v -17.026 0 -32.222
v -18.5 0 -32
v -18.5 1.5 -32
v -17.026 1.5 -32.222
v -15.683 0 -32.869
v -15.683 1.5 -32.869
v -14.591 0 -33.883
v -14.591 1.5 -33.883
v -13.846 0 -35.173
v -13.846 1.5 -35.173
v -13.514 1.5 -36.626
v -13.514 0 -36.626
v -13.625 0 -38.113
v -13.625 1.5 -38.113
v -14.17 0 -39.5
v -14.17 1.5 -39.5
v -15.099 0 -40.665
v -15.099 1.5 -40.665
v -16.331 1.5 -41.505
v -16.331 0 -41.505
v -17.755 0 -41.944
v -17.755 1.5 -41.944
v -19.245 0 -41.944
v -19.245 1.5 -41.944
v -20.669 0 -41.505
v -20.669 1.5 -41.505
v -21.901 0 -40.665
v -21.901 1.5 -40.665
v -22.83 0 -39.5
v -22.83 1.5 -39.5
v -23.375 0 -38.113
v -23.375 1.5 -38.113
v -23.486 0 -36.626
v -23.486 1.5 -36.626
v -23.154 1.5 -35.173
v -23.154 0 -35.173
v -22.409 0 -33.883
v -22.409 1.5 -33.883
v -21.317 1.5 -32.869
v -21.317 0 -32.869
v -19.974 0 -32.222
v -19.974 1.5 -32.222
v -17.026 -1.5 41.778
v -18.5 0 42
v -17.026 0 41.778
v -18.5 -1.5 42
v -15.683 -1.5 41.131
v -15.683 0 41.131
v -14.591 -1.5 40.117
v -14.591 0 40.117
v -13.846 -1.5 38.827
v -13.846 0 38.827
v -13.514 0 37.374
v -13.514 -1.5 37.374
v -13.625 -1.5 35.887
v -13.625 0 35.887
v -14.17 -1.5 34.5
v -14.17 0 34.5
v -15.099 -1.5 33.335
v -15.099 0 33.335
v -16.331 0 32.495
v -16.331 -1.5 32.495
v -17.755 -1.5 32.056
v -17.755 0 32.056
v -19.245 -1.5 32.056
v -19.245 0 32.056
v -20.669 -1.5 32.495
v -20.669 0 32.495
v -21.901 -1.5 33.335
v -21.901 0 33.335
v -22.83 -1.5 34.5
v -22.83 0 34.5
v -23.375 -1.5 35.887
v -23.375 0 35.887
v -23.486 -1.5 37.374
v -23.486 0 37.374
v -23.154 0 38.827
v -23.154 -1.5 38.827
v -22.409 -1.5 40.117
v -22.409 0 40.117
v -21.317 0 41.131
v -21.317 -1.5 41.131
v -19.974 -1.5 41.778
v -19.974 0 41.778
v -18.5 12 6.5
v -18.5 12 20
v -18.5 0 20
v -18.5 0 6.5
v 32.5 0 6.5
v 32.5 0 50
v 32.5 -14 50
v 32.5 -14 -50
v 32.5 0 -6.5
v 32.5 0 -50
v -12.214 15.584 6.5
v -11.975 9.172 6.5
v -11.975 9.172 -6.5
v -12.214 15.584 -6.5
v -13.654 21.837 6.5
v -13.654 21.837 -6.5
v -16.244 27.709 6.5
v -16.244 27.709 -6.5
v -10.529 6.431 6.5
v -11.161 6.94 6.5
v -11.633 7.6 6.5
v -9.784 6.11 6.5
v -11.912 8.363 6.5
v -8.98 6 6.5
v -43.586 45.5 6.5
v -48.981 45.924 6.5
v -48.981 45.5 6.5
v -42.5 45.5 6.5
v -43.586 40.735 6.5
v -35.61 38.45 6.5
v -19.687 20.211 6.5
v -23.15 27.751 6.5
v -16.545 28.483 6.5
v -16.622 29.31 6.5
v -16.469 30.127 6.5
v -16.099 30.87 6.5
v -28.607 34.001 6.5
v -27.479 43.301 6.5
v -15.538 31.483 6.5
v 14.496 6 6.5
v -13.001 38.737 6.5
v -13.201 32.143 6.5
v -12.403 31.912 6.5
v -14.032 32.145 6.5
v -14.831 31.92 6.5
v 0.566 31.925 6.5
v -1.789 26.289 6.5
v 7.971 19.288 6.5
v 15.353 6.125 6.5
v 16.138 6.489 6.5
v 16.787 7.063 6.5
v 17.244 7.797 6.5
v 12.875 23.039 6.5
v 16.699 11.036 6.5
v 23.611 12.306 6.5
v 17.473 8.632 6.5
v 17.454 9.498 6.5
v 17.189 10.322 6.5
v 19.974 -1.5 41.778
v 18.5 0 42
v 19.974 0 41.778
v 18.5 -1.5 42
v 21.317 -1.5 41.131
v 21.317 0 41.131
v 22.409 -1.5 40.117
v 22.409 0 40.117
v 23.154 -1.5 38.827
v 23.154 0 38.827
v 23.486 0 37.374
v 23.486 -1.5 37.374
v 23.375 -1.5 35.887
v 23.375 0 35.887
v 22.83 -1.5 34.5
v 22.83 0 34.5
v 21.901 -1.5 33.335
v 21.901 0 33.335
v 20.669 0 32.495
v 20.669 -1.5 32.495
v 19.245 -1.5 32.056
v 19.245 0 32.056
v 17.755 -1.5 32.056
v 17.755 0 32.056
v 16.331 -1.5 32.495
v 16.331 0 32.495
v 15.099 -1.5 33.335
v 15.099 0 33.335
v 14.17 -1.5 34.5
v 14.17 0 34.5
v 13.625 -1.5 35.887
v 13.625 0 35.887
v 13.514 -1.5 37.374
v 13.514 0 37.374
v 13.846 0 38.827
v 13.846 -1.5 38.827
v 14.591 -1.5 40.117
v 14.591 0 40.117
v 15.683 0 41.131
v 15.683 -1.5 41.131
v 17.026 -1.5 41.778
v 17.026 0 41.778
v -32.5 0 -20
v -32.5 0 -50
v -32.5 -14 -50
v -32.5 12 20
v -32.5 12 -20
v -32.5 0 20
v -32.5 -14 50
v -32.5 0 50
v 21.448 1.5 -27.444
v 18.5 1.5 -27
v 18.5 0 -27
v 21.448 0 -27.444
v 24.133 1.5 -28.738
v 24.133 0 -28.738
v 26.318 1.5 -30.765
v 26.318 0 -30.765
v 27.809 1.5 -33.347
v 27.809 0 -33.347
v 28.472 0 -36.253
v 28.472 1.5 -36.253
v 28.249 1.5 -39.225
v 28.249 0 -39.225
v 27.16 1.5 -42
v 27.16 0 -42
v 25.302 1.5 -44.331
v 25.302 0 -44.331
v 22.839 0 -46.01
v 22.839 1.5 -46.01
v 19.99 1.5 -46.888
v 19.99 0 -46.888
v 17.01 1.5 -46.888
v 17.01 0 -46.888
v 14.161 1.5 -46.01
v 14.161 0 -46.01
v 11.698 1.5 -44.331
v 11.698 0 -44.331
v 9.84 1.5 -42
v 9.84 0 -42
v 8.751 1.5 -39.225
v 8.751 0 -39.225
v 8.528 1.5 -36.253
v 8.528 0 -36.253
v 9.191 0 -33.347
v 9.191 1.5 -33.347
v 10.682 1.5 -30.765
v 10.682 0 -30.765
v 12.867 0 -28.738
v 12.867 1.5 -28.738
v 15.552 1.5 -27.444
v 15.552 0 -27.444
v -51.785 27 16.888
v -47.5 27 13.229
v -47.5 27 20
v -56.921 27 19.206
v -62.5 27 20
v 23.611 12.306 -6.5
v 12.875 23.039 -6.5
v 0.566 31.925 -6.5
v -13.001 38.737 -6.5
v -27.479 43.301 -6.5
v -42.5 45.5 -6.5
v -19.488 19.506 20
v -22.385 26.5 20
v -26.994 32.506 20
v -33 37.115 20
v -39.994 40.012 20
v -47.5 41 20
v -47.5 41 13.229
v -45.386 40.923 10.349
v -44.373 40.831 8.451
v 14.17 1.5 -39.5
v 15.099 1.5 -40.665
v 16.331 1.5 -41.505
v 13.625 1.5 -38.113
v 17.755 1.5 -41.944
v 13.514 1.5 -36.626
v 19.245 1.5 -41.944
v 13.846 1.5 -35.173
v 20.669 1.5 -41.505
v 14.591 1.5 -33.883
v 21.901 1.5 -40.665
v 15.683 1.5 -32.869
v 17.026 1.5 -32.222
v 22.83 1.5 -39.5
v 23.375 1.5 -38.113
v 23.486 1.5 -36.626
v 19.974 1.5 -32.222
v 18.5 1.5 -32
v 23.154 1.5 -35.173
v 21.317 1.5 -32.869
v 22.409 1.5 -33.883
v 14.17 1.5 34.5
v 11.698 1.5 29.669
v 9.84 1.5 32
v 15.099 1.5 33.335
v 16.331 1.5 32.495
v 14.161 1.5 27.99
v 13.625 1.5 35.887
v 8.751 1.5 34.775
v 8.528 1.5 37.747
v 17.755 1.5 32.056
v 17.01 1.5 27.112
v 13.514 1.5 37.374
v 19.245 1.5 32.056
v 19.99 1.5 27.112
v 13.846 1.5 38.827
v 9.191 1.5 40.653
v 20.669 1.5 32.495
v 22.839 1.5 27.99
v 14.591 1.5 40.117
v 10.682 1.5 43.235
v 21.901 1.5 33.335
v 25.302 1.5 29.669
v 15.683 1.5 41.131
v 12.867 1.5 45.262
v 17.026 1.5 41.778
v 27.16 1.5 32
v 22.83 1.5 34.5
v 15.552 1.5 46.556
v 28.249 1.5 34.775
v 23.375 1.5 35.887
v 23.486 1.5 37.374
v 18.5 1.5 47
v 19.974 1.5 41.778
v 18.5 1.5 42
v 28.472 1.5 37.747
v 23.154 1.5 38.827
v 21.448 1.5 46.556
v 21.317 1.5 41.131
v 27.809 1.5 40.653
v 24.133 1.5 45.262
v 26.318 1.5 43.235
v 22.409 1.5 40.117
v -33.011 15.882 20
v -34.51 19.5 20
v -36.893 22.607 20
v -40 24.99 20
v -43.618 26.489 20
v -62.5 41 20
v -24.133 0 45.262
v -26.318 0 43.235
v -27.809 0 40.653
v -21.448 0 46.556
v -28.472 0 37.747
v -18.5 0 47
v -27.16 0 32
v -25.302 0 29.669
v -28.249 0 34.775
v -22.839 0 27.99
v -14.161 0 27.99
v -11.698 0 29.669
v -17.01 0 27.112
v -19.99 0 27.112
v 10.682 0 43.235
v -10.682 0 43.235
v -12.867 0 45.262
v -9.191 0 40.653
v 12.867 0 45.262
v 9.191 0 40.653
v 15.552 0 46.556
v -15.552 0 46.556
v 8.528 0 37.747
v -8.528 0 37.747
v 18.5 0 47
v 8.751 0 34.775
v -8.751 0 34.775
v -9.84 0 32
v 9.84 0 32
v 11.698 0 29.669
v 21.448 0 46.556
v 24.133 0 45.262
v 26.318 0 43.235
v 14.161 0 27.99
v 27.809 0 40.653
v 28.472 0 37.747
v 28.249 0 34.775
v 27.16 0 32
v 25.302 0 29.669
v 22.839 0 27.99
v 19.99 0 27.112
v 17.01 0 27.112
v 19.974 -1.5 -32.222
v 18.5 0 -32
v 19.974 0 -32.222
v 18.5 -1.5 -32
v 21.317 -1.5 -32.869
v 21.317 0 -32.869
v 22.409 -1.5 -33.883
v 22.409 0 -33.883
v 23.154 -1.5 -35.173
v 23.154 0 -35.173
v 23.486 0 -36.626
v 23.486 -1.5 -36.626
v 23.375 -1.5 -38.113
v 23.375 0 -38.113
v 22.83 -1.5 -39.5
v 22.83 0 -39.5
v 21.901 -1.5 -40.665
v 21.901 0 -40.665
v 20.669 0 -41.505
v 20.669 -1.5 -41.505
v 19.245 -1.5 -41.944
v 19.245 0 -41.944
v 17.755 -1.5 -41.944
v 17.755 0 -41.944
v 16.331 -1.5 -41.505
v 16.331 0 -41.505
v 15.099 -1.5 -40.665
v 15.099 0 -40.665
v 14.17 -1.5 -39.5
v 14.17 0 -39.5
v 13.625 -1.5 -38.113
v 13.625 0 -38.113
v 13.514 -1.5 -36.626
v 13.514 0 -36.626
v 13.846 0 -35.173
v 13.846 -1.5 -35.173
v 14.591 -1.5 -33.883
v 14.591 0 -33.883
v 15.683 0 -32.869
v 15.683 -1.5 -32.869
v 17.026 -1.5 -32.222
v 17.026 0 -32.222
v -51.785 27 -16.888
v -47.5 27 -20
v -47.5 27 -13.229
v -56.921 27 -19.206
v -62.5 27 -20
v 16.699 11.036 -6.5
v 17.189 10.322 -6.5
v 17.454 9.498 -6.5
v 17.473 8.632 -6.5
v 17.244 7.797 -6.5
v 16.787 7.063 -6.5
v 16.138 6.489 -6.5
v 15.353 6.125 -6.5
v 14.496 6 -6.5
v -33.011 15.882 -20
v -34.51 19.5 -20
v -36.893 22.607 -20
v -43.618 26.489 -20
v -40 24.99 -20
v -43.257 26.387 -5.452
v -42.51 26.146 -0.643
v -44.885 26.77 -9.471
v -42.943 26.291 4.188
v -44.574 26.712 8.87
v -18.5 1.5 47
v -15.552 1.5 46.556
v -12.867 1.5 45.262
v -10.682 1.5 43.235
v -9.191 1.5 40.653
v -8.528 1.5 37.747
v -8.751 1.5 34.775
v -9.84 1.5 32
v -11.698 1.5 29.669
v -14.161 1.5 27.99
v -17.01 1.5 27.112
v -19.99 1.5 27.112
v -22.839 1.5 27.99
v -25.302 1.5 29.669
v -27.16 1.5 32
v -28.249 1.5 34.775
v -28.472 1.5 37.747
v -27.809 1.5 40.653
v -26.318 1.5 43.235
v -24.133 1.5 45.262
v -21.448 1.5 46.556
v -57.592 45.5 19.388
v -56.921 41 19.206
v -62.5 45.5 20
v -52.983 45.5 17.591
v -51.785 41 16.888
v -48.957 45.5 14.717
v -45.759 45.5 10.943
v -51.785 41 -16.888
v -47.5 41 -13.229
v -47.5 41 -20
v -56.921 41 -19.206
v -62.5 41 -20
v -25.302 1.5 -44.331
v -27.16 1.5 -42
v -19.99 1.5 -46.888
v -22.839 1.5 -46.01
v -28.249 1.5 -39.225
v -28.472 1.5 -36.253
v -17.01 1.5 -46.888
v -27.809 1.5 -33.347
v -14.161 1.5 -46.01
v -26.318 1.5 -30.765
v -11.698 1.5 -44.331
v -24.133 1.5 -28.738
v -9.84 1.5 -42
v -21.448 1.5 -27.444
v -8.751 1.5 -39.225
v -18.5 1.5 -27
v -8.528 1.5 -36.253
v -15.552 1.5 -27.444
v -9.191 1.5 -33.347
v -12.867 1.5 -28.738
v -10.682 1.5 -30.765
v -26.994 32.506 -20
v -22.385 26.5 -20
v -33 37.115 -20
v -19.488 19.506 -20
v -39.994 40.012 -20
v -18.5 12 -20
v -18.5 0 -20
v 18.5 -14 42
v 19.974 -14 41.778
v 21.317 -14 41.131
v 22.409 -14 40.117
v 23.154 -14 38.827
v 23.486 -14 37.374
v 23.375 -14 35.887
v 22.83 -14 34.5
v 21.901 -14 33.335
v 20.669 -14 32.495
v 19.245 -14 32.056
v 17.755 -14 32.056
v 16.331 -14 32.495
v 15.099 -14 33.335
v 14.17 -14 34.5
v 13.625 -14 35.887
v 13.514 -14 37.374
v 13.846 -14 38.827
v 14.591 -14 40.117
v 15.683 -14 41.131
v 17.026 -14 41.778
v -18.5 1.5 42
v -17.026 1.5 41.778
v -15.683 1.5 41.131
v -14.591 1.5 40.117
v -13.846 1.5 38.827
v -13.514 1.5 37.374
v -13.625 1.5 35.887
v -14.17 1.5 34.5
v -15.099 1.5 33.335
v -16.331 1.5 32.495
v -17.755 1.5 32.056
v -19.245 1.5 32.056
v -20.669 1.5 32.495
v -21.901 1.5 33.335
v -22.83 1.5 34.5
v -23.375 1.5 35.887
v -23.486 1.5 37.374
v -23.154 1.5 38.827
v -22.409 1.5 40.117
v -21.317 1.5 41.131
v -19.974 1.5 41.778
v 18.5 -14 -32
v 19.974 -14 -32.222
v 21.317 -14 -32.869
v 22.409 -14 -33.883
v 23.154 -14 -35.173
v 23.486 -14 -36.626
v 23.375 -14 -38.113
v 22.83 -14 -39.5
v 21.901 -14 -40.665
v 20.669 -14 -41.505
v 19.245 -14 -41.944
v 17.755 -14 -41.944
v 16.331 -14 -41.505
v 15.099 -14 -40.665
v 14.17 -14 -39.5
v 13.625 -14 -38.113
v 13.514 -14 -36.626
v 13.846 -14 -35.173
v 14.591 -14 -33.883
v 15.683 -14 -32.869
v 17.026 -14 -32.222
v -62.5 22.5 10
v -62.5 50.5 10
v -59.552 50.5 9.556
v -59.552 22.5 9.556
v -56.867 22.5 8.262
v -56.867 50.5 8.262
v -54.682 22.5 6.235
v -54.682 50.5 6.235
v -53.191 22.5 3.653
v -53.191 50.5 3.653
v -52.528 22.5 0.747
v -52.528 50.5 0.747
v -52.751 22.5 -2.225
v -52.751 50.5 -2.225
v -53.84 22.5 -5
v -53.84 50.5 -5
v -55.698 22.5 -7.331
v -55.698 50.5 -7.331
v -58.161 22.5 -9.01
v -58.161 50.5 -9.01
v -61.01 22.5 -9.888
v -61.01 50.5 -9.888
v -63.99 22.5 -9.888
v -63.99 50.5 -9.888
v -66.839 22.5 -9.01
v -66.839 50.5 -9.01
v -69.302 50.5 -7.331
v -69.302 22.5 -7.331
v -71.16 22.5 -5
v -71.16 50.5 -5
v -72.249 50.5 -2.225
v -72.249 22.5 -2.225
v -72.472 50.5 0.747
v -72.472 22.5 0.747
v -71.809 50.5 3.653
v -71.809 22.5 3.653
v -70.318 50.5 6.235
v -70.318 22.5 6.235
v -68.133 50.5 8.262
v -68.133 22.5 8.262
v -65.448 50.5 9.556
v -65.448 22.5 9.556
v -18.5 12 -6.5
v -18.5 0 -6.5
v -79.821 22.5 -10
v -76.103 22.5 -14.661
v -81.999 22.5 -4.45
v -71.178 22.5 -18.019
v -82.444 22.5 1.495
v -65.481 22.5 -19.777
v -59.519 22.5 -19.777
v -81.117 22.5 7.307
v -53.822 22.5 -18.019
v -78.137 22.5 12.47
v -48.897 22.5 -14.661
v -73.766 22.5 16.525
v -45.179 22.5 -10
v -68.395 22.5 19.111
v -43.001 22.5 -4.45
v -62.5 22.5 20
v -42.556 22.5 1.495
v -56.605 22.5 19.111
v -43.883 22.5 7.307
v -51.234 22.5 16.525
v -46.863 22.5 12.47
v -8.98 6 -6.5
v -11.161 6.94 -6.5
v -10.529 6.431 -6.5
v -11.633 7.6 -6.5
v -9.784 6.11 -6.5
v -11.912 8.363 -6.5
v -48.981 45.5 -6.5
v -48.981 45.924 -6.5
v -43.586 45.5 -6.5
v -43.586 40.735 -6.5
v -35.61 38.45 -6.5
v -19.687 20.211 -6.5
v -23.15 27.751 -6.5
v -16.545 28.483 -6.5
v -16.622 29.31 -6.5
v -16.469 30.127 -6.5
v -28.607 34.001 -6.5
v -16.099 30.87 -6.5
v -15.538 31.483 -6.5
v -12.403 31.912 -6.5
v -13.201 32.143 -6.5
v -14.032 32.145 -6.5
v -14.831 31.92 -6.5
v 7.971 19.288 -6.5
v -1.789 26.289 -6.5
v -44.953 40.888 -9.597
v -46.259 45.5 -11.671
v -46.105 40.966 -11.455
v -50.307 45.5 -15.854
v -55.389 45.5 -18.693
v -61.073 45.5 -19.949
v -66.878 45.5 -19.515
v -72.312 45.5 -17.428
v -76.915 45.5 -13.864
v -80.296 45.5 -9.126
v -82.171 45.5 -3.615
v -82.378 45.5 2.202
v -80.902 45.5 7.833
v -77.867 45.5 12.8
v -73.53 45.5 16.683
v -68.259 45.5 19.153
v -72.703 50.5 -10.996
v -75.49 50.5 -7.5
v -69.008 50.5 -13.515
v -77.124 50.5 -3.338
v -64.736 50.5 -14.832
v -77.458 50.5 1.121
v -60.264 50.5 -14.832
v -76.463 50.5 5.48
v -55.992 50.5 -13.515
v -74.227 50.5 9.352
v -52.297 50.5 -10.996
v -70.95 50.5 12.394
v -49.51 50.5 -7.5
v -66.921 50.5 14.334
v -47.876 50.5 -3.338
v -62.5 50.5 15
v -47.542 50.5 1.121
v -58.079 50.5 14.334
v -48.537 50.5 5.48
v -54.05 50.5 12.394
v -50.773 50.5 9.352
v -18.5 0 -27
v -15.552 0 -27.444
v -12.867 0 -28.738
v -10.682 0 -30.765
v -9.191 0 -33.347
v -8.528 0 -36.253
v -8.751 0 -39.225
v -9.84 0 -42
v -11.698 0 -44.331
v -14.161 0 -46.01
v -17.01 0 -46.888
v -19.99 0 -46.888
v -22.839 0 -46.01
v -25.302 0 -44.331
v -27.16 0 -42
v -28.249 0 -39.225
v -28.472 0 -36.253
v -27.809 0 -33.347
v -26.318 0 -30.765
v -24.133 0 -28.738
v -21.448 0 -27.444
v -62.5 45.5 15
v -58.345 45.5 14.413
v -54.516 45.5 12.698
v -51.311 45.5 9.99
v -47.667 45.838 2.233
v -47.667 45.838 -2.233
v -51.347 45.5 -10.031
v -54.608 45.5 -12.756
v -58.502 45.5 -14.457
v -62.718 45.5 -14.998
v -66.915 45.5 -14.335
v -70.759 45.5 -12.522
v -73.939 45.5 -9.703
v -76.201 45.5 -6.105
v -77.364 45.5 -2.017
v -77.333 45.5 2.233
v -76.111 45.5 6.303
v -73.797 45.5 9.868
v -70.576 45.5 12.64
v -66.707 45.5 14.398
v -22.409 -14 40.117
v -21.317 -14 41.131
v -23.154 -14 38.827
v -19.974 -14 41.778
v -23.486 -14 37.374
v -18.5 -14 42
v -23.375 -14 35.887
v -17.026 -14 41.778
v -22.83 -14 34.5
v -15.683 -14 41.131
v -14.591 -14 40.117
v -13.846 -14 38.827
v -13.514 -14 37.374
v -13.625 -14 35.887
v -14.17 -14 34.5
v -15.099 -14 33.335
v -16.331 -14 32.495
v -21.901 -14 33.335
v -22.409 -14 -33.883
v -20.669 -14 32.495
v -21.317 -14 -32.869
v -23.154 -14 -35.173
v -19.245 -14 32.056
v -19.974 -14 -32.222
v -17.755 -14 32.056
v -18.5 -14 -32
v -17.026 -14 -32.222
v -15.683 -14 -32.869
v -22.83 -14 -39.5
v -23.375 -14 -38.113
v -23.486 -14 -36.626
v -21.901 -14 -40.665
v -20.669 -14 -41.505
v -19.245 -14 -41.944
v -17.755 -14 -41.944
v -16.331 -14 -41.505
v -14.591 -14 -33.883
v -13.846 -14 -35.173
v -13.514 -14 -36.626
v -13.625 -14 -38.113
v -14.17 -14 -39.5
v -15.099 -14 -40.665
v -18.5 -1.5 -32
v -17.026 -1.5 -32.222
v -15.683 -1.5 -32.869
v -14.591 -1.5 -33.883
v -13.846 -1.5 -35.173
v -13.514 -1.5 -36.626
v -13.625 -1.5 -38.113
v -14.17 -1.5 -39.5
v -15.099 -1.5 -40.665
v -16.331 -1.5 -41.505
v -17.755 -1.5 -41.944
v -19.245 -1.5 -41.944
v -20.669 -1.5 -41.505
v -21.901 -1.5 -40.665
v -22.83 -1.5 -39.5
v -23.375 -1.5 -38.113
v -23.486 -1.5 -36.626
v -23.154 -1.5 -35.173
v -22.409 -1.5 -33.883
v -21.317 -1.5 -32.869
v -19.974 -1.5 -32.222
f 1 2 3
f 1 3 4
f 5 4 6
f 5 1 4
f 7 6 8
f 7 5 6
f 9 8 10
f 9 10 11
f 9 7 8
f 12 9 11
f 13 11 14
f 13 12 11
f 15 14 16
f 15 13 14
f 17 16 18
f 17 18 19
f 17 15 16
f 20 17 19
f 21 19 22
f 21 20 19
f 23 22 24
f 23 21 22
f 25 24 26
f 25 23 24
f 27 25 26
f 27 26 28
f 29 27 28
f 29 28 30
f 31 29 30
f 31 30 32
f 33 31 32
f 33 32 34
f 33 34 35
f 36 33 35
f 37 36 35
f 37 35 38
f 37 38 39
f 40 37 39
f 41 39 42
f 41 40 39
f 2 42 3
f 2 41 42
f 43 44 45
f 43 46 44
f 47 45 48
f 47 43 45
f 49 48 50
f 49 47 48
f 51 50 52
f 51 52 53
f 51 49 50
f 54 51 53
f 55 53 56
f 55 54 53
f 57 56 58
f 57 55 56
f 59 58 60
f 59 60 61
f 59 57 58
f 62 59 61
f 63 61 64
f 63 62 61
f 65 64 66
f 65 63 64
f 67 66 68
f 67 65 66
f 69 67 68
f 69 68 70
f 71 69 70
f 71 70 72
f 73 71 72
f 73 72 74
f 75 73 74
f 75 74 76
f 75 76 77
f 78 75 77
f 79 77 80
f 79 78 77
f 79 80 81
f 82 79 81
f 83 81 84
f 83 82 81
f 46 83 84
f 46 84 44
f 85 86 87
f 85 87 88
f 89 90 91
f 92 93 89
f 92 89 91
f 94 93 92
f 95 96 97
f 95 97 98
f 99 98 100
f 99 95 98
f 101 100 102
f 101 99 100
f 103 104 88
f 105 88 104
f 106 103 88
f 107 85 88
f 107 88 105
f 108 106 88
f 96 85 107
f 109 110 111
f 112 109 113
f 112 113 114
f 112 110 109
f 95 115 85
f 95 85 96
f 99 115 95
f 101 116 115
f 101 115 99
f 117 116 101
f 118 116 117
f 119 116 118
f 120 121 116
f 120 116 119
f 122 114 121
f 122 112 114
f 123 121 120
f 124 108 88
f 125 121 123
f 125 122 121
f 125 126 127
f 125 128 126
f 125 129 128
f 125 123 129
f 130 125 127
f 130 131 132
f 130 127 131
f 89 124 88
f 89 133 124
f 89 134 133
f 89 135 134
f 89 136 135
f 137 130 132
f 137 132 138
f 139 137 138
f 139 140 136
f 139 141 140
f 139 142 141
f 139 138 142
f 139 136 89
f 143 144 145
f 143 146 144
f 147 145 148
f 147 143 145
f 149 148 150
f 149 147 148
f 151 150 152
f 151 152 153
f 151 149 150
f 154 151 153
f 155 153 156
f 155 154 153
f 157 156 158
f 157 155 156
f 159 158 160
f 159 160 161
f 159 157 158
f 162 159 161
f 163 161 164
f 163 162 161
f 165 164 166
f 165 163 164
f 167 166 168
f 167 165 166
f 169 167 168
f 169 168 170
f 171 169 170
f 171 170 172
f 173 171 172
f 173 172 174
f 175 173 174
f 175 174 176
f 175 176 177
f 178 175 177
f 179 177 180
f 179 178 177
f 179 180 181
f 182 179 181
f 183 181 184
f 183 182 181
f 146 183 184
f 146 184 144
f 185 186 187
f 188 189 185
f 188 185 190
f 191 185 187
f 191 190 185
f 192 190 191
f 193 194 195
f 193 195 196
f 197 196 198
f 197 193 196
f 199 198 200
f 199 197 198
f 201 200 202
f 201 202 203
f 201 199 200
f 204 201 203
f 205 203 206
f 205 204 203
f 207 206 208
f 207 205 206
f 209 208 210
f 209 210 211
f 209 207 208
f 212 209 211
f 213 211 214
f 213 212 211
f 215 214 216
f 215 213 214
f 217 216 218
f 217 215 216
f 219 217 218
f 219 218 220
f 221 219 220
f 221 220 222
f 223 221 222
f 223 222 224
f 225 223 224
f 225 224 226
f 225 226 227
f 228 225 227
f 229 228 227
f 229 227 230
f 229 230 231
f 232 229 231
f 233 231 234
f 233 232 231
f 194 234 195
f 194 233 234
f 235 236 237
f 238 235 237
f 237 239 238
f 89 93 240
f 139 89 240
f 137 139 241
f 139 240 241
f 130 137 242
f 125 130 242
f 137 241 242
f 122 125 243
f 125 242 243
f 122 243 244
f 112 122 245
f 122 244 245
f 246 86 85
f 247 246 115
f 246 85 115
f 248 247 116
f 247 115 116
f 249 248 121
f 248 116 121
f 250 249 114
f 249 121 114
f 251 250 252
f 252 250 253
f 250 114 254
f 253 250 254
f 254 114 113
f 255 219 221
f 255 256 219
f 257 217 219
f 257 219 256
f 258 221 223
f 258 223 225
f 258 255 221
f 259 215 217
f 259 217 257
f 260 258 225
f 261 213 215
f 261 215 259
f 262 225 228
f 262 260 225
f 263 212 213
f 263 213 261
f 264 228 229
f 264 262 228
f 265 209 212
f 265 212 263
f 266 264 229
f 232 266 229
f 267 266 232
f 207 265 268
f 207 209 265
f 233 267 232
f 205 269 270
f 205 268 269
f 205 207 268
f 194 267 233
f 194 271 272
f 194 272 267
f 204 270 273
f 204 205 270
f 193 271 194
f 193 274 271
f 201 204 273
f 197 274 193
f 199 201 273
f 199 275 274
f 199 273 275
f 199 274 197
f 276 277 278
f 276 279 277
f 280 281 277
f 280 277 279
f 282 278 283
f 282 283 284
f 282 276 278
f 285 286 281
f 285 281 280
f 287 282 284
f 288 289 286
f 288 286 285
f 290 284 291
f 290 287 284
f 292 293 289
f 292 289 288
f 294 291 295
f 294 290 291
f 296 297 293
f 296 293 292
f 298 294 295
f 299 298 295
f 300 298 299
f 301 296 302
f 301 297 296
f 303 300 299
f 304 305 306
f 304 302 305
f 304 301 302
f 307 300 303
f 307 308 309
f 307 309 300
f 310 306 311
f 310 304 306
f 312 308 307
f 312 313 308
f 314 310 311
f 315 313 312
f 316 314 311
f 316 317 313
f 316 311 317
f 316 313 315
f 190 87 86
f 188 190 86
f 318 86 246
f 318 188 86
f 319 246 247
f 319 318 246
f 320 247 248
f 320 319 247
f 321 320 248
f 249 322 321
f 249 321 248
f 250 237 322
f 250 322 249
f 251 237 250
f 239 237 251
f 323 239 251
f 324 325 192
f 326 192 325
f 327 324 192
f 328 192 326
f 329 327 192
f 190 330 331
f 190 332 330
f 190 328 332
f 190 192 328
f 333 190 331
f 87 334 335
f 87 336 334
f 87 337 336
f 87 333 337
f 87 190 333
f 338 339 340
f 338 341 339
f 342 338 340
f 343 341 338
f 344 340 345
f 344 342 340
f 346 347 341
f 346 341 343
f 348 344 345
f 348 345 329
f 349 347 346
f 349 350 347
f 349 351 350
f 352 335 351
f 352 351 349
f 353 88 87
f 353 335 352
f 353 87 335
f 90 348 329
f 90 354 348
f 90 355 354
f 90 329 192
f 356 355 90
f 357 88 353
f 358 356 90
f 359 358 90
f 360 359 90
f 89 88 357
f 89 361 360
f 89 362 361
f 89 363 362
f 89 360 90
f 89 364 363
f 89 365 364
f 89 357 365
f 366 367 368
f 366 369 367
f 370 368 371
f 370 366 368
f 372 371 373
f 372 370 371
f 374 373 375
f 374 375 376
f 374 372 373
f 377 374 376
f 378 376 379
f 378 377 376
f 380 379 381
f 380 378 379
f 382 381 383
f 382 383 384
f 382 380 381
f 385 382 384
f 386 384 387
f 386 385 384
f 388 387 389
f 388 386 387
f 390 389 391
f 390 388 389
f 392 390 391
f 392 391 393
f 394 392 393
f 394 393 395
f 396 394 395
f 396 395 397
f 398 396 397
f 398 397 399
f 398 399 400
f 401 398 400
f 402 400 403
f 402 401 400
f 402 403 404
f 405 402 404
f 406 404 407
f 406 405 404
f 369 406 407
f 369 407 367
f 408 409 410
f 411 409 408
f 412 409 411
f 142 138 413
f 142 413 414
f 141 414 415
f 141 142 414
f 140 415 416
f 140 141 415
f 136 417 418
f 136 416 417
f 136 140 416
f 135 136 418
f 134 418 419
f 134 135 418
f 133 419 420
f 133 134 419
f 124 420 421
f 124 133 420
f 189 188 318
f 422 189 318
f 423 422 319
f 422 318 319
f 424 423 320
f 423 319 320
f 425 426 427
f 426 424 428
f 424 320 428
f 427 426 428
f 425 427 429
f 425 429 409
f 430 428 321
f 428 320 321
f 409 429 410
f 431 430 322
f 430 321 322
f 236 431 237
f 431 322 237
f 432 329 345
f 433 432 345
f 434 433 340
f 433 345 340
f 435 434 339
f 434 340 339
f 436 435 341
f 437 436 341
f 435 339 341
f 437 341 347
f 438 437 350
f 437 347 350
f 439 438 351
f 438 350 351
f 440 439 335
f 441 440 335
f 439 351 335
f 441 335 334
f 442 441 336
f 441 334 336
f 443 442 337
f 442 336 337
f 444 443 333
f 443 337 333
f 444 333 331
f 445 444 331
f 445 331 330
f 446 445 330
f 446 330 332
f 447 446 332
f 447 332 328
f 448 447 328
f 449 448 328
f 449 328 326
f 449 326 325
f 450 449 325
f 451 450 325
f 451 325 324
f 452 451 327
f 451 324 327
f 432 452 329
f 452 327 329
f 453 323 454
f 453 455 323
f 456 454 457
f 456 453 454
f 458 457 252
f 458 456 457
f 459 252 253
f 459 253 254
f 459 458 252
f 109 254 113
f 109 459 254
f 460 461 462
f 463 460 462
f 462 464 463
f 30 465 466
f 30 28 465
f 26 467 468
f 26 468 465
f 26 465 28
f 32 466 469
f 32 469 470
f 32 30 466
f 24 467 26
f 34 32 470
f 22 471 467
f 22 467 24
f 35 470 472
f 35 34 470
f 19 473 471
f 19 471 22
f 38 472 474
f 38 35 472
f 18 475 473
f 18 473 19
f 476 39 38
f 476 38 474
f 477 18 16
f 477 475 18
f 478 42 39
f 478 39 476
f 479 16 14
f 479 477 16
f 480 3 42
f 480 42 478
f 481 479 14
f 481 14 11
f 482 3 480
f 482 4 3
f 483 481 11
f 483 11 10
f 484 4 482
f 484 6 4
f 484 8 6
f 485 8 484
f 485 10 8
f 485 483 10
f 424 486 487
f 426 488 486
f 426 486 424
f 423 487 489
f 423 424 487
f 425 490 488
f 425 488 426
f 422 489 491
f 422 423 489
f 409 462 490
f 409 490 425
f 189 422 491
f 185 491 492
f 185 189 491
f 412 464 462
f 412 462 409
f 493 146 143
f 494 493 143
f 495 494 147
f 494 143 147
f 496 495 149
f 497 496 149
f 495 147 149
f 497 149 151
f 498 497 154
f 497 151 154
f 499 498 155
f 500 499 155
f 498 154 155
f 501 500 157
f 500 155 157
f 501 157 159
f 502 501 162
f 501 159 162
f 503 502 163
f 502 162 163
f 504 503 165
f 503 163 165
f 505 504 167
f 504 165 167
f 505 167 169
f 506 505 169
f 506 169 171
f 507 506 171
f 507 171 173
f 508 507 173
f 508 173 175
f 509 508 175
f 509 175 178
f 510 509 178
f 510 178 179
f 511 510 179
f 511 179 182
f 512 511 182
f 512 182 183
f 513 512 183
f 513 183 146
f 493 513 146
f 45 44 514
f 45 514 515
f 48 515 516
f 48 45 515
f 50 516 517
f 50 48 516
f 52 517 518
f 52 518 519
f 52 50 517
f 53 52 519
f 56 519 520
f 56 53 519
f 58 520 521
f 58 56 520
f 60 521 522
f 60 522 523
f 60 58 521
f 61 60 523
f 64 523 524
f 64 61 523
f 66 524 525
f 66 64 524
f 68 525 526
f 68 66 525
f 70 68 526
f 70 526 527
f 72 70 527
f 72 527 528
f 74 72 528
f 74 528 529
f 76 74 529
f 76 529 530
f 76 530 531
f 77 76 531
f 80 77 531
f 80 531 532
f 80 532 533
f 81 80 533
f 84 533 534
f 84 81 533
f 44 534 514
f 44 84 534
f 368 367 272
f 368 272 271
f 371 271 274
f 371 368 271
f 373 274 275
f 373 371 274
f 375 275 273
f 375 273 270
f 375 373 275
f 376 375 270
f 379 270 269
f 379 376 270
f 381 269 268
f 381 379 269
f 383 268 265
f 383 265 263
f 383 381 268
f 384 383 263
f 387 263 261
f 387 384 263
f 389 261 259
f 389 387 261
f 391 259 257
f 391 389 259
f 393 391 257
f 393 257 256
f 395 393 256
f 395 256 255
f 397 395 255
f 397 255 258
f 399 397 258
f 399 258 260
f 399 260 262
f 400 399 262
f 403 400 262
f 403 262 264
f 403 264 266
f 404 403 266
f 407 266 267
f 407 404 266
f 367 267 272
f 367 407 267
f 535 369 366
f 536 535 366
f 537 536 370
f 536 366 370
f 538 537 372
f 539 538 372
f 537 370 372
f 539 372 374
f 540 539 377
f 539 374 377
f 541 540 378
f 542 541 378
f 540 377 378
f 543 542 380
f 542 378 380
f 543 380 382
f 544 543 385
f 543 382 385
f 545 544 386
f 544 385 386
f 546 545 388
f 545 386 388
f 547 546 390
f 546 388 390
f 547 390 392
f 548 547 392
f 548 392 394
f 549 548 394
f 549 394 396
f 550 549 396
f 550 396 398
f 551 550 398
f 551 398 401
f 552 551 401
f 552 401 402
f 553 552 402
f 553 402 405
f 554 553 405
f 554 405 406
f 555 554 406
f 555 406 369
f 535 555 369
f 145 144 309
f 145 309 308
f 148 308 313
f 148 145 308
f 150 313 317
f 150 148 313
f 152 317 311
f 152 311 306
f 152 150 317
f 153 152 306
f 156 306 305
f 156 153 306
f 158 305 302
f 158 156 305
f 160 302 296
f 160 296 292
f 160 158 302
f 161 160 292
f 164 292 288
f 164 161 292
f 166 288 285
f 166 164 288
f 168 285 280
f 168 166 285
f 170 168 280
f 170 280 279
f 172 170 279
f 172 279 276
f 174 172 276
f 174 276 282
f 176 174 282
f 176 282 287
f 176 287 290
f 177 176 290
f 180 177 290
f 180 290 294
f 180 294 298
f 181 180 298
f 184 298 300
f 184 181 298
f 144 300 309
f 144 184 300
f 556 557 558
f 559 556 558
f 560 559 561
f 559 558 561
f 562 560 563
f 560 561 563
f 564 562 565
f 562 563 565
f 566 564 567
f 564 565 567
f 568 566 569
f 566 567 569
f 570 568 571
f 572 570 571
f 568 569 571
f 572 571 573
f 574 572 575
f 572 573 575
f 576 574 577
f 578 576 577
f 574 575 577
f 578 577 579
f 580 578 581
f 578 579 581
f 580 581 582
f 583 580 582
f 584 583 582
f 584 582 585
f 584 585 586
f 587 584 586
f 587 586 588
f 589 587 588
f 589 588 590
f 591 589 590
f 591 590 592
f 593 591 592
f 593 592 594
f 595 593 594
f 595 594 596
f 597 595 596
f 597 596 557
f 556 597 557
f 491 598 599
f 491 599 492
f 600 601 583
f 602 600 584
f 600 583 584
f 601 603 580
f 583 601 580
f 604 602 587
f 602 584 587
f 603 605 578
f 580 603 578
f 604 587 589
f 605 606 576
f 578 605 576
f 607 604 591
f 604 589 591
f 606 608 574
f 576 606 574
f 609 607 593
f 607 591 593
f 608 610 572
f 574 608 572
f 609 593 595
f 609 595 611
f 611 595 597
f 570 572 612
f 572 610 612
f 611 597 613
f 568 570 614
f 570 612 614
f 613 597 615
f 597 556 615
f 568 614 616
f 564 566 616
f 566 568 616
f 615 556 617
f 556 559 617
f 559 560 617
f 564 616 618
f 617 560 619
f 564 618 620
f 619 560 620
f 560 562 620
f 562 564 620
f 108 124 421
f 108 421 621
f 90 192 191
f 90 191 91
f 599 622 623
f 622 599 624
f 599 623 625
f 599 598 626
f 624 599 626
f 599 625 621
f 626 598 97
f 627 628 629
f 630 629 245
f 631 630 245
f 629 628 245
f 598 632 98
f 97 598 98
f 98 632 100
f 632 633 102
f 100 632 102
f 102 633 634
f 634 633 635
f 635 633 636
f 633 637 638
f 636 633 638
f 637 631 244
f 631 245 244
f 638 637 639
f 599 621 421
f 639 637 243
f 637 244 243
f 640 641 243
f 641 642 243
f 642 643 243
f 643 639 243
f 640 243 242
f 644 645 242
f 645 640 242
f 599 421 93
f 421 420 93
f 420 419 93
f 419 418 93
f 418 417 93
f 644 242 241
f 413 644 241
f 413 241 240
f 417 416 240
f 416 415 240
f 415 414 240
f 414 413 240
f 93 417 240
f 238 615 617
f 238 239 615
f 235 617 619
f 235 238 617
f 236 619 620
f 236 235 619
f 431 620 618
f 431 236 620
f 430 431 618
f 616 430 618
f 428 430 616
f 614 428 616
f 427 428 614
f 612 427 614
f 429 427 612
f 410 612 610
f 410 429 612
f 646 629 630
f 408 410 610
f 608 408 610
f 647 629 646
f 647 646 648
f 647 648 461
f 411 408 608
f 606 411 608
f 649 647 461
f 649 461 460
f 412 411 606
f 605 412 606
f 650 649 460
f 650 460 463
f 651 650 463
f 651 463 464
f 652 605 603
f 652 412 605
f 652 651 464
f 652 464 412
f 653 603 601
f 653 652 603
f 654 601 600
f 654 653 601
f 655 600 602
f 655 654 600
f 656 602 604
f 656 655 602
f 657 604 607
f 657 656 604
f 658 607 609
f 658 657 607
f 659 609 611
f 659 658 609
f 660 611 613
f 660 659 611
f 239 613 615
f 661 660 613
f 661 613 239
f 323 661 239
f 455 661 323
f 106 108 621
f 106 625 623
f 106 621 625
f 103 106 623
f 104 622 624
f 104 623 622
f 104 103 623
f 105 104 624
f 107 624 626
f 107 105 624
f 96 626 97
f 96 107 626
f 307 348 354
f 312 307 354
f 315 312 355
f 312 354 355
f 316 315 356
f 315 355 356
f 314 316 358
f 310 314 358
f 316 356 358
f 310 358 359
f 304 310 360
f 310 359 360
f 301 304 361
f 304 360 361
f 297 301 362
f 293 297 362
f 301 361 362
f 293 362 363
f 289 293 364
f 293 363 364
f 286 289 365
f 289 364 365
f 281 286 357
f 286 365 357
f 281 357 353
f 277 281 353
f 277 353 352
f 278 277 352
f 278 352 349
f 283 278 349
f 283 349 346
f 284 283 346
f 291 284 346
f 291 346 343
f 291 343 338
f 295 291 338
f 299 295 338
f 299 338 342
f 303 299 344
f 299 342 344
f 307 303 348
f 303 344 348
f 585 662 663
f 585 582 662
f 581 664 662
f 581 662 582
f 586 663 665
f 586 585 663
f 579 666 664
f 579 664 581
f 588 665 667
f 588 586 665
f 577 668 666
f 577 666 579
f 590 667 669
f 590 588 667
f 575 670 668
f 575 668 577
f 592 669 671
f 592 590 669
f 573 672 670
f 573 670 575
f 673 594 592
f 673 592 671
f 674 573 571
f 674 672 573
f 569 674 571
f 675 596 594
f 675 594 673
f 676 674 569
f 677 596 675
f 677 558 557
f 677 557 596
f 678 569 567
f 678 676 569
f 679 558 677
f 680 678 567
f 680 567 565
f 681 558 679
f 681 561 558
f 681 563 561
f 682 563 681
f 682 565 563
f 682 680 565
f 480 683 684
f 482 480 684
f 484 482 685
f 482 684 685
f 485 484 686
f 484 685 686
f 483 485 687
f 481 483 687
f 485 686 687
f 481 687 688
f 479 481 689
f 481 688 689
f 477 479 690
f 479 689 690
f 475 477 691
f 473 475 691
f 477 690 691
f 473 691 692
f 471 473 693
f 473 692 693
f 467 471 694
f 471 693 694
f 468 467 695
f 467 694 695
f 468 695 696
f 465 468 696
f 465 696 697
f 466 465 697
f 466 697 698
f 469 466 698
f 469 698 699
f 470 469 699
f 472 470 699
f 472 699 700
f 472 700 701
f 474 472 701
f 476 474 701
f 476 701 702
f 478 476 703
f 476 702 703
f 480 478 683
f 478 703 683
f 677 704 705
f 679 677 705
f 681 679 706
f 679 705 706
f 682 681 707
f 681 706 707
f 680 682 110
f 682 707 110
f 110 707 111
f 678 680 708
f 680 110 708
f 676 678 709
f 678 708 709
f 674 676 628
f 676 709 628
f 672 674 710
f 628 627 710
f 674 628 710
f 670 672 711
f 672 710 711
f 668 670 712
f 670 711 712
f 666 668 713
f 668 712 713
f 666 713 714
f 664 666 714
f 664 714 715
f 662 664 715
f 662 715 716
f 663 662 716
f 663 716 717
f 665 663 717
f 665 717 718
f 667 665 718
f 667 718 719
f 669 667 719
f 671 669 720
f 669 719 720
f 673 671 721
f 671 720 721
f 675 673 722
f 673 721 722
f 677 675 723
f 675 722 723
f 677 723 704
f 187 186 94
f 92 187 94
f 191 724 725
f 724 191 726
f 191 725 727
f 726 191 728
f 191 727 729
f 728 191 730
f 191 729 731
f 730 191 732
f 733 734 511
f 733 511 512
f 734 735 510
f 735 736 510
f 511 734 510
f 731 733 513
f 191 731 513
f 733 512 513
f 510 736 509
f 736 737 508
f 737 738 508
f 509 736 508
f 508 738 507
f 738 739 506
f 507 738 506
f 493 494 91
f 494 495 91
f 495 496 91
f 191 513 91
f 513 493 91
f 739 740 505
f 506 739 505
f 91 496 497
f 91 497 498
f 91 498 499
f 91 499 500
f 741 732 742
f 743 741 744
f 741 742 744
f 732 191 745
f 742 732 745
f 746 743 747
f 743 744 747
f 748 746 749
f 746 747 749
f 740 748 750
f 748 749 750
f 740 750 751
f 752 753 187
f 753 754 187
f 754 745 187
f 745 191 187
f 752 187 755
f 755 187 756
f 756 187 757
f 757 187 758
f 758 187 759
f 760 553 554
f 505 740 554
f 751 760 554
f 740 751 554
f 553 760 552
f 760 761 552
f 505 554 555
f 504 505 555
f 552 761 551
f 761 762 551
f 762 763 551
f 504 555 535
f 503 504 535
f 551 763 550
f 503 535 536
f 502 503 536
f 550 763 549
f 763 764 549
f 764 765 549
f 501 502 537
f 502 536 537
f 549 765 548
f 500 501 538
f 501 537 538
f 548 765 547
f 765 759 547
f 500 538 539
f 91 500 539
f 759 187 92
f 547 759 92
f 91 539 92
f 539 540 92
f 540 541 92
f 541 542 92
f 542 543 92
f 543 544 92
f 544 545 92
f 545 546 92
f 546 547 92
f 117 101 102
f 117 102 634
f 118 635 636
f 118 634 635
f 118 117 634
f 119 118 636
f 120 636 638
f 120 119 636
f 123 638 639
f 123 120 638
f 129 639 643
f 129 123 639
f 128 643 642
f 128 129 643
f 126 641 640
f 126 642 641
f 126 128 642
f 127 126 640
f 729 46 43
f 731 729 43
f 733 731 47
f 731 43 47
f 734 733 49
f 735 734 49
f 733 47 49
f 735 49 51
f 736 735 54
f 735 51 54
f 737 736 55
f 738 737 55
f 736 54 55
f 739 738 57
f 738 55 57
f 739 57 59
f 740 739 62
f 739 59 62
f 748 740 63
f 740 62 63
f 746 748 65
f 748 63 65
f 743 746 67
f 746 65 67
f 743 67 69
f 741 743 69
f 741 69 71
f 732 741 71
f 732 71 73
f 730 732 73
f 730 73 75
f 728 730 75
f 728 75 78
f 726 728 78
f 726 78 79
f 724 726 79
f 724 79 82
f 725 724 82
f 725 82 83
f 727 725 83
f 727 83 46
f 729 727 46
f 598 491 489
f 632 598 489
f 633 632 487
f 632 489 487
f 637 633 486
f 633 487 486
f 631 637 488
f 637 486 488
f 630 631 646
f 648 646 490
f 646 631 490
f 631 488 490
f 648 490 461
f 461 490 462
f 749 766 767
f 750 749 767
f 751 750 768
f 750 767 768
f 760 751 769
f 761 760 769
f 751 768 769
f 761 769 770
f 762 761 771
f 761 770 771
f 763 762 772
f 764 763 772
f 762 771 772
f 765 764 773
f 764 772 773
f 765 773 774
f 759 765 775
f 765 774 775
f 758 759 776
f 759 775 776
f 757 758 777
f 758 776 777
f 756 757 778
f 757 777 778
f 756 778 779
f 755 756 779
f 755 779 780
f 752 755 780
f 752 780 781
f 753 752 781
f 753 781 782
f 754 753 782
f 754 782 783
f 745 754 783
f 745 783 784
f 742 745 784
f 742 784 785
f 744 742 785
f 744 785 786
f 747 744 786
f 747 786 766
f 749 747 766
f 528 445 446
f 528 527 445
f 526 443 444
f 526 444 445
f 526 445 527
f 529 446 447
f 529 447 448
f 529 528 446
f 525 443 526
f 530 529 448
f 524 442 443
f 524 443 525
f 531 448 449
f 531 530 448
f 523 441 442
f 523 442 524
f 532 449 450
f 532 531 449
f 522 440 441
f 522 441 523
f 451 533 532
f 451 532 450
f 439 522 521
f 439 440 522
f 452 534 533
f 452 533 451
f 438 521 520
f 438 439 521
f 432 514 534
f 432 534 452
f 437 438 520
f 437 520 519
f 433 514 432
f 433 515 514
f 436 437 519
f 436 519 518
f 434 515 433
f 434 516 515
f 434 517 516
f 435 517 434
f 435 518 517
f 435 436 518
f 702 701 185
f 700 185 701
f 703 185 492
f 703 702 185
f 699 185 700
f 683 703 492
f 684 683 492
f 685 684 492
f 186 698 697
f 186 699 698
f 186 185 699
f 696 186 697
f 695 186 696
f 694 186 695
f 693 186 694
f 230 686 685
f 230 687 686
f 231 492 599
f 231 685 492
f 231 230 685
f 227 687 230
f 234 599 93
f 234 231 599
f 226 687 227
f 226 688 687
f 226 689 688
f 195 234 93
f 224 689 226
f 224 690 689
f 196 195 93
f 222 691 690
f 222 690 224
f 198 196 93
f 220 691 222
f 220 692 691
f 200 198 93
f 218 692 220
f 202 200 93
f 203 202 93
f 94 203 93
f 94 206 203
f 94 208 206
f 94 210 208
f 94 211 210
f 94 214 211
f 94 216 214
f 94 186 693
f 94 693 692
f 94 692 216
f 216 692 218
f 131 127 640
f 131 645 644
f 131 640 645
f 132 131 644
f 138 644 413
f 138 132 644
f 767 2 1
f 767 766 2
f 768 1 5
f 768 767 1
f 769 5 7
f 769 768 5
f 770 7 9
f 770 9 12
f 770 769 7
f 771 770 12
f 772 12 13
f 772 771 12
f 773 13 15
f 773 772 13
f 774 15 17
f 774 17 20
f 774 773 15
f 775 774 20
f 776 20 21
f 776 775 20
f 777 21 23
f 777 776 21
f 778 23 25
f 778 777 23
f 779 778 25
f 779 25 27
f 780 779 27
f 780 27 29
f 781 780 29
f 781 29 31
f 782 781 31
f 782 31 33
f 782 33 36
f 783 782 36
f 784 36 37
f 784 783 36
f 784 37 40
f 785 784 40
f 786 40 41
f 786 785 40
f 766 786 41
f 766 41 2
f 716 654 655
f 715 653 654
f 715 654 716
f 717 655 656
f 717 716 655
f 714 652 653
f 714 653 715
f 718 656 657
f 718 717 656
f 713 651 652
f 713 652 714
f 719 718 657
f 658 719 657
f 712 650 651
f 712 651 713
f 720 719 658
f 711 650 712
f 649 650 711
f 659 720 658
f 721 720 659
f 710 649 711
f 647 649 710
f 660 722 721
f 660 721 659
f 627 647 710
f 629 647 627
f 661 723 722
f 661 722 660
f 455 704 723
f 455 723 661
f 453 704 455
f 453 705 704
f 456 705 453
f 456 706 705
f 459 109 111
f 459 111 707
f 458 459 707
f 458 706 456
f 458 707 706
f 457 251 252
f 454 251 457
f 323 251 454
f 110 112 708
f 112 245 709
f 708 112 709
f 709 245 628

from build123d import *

# Parameters (mm, degrees)
SKETCH1_W            = 65
SKETCH1_H            = 100
SKETCH1_R            = 10
BOSS_EXTRUDE1_DEPTH  = 14
SKETCH1_4_R          = 10
SKETCH1_4_R_2        = 5
BOSS_EXTRUDE3_DEPTH  = 1.5
SKETCH1_8_R          = 10
SKETCH1_8_R_2        = 5
BOSS_EXTRUDE6_DEPTH  = 14
SKETCH5_W            = 14
SKETCH5_H            = 40
SKETCH8_R            = 20
BOSS_EXTRUDE8_DEPTH  = 11.5
SKETCH11_R           = 15
BOSS_EXTRUDE10_DEPTH = 5
CUT_EXTRUDE1_REACH   = 118.045
SKETCH12_R           = 10
RIB1_START           = -6.5
RIB1_DEPTH           = 13
CUT_EXTRUDE2_DEPTH   = 15


# Read off the part's stored shape, not the designer's step: Rib1
with BuildPart() as part:
    # Sketch1 → Boss-Extrude1 (new body)
    with BuildSketch(Plane(origin=(0, 0, 0), x_dir=(1, 0, 0), z_dir=(0, 1, 0))):
        Rectangle(SKETCH1_W, SKETCH1_H)
        with Locations(Location((-18.5, 37, 0), (0, 0, 270))):
            Circle(SKETCH1_R, mode=Mode.SUBTRACT)
        with Locations(Location((18.5, -37, 0), (0, 0, 270))):
            Circle(SKETCH1_R, mode=Mode.SUBTRACT)
        with Locations(Location((-18.5, -37, 0), (0, 0, 270))):
            Circle(SKETCH1_R, mode=Mode.SUBTRACT)
        with Locations(Location((18.5, 37, 0), (0, 0, 270))):
            Circle(SKETCH1_R, mode=Mode.SUBTRACT)
    extrude(amount=-BOSS_EXTRUDE1_DEPTH)

    # Sketch1<4> → Boss-Extrude3 (add, symmetric)
    # profile 1 of 4: a face of its own
    with BuildSketch(Plane(origin=(0, 0, 0), x_dir=(1, 0, 0), z_dir=(0, 1, 0))):
        with Locations(Location((18.5, -37, 0), (0, 0, 270))):
            Circle(SKETCH1_4_R)
        with Locations(Location((18.5, -37, 0), (0, 0, 270))):
            Circle(SKETCH1_4_R_2, mode=Mode.SUBTRACT)
    # profile 2 of 4: a face of its own
    with BuildSketch(Plane(origin=(0, 0, 0), x_dir=(1, 0, 0), z_dir=(0, 1, 0))):
        with Locations(Location((-18.5, -37, 0), (0, 0, 270))):
            Circle(SKETCH1_4_R)
        with Locations(Location((-18.5, -37, 0), (0, 0, 270))):
            Circle(SKETCH1_4_R_2, mode=Mode.SUBTRACT)
    # profile 3 of 4: a face of its own
    with BuildSketch(Plane(origin=(0, 0, 0), x_dir=(1, 0, 0), z_dir=(0, 1, 0))):
        with Locations(Location((-18.5, 37, 0), (0, 0, 270))):
            Circle(SKETCH1_4_R)
        with Locations(Location((-18.5, 37, 0), (0, 0, 270))):
            Circle(SKETCH1_4_R_2, mode=Mode.SUBTRACT)
    # profile 4 of 4: a face of its own
    with BuildSketch(Plane(origin=(0, 0, 0), x_dir=(1, 0, 0), z_dir=(0, 1, 0))):
        with Locations(Location((18.5, 37, 0), (0, 0, 270))):
            Circle(SKETCH1_4_R)
        with Locations(Location((18.5, 37, 0), (0, 0, 270))):
            Circle(SKETCH1_4_R_2, mode=Mode.SUBTRACT)
    extrude(amount=BOSS_EXTRUDE3_DEPTH, both=True)

    # Sketch1<8> → Boss-Extrude6 (add)
    # profile 1 of 4: a face of its own
    with BuildSketch(Plane(origin=(0, 0, 0), x_dir=(1, 0, 0), z_dir=(0, 1, 0))):
        with Locations(Location((18.5, -37, 0), (0, 0, 270))):
            Circle(SKETCH1_8_R)
        with Locations(Location((18.5, -37, 0), (0, 0, 270))):
            Circle(SKETCH1_8_R_2, mode=Mode.SUBTRACT)
    # profile 2 of 4: a face of its own
    with BuildSketch(Plane(origin=(0, 0, 0), x_dir=(1, 0, 0), z_dir=(0, 1, 0))):
        with Locations(Location((-18.5, -37, 0), (0, 0, 270))):
            Circle(SKETCH1_8_R)
        with Locations(Location((-18.5, -37, 0), (0, 0, 270))):
            Circle(SKETCH1_8_R_2, mode=Mode.SUBTRACT)
    # profile 3 of 4: a face of its own
    with BuildSketch(Plane(origin=(0, 0, 0), x_dir=(1, 0, 0), z_dir=(0, 1, 0))):
        with Locations(Location((-18.5, 37, 0), (0, 0, 270))):
            Circle(SKETCH1_8_R)
        with Locations(Location((-18.5, 37, 0), (0, 0, 270))):
            Circle(SKETCH1_8_R_2, mode=Mode.SUBTRACT)
    # profile 4 of 4: a face of its own
    with BuildSketch(Plane(origin=(0, 0, 0), x_dir=(1, 0, 0), z_dir=(0, 1, 0))):
        with Locations(Location((18.5, 37, 0), (0, 0, 270))):
            Circle(SKETCH1_8_R)
        with Locations(Location((18.5, 37, 0), (0, 0, 270))):
            Circle(SKETCH1_8_R_2, mode=Mode.SUBTRACT)
    extrude(amount=-BOSS_EXTRUDE6_DEPTH)

    # Sweep1: sweep along a path in Sketch6
    with BuildLine(Plane.XY) as sweep1_path:
        Line((-32.5, 0), (-32.5, 12))
        ThreePointArc((-32.5, 12), (-36.893398282, 22.606601718), (-47.5, 27))
        Line((-47.5, 27), (-62.5, 27))
    # Sketch5 → Sweep1 (sweep)
    with BuildSketch(Plane(origin=(0, 0, 0), x_dir=(1, 0, 0), z_dir=(0, 1, 0))):
        with Locations((-25.5, 0)):
            Rectangle(SKETCH5_W, SKETCH5_H)
    sweep(path=sweep1_path.line)

    # Sketch8 → Boss-Extrude8 (add, symmetric)
    with BuildSketch(Plane(origin=(0, 34, 0), x_dir=(1, 0, 0), z_dir=(0, 1, 0))):
        with Locations(Location((-62.5, 0, 0), (0, 0, 270))):
            Circle(SKETCH8_R)
    extrude(amount=BOSS_EXTRUDE8_DEPTH, both=True)

    # Sketch11 → Boss-Extrude10 (add)
    with BuildSketch(Plane(origin=(0, 45.5, 0), x_dir=(1, 0, 0), z_dir=(0, 1, 0))):
        with Locations(Location((-62.5, 0, 0), (0, 0, 270))):
            Circle(SKETCH11_R)
    extrude(amount=BOSS_EXTRUDE10_DEPTH)

    # Sketch12 → Cut-Extrude1 (cut, up to next)
    with BuildSketch(Plane(origin=(0, 50.5, 0), x_dir=(1, 0, 0), z_dir=(0, 1, 0)), mode=Mode.PRIVATE) as cut_extrude1_sk1:
        with Locations(Location((-62.5, 0, 0), (0, 0, 270))):
            Circle(SKETCH12_R)
    cut_extrude1_tool1 = extrude(cut_extrude1_sk1.sketch, amount=-CUT_EXTRUDE1_REACH, mode=Mode.PRIVATE) & part.part
    add(cut_extrude1_tool1.solids().sort_by_distance((-62.5, 50.5, 0))[0], mode=Mode.SUBTRACT)

    # Rib1 outline → Rib1 (add)
    with BuildSketch(Plane.XY.offset(RIB1_START)):
        with BuildLine():
            Line((-50, 45.991191737), (-50, 41))
            Line((-50, 41), (-47.5, 41))
            ThreePointArc((-47.5, 41), (-26.993903346, 32.506096654), (-18.5, 12))
            Line((-18.5, 12), (-18.5, 0))
            Line((-18.5, 0), (32.5, 0))
            ThreePointArc((32.5, 0), (0.566198386, 31.925052284), (-42.5, 45.5))
            Line((-42.5, 45.5), (-48.981494165, 45.924487517))
            Line((-48.981494165, 45.924487517), (-50, 45.991191737))
        make_face()
    extrude(amount=RIB1_DEPTH)

    # Sketch14 → Cut-Extrude2 (cut, symmetric)
    with BuildSketch(Plane.XY):
        with BuildLine():
            Line((14.495933603, 6), (-8.980084126, 6))
            ThreePointArc((-8.980084126, 6), (-11.161205142, 6.940215761), (-11.975176588, 9.171525926))
            ThreePointArc((-11.975176588, 9.171525926), (-12.786554884, 18.744648632), (-16.243500658, 27.708606407))
            ThreePointArc((-16.243500658, 27.708606407), (-15.839776142, 31.196285594), (-12.402605555, 31.912356784))
            ThreePointArc((-12.402605555, 31.912356784), (3.209342465, 22.95318127), (16.699316747, 11.035952535))
            ThreePointArc((16.699316747, 11.035952535), (17.244374762, 7.797472995), (14.495933603, 6))
        make_face()
    extrude(amount=CUT_EXTRUDE2_DEPTH, both=True, mode=Mode.SUBTRACT)


solid = part.part
